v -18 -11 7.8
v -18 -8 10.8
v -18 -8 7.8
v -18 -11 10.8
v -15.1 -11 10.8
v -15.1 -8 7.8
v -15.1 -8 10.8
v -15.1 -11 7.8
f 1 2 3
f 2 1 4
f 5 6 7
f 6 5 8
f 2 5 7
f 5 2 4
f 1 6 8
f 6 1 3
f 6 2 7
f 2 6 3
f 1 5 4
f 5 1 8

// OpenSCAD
// The back X lock nut must sit in a closed pocket, not a slot through the
// slider's end face: the -X end around the nut's Y and height must be
// solid (the symmetry check covers +X). Must render NON-empty.
include <../stage.scad>
z = stage_base_h + xs_lock_z;
intersection() {
  stage_x_slider();
  translate([xs_xc - xs_len / 2 - 0.1, xs_back_nut_y - 1.5, z - 1.5]) cube([3, 3, 3]);
}
